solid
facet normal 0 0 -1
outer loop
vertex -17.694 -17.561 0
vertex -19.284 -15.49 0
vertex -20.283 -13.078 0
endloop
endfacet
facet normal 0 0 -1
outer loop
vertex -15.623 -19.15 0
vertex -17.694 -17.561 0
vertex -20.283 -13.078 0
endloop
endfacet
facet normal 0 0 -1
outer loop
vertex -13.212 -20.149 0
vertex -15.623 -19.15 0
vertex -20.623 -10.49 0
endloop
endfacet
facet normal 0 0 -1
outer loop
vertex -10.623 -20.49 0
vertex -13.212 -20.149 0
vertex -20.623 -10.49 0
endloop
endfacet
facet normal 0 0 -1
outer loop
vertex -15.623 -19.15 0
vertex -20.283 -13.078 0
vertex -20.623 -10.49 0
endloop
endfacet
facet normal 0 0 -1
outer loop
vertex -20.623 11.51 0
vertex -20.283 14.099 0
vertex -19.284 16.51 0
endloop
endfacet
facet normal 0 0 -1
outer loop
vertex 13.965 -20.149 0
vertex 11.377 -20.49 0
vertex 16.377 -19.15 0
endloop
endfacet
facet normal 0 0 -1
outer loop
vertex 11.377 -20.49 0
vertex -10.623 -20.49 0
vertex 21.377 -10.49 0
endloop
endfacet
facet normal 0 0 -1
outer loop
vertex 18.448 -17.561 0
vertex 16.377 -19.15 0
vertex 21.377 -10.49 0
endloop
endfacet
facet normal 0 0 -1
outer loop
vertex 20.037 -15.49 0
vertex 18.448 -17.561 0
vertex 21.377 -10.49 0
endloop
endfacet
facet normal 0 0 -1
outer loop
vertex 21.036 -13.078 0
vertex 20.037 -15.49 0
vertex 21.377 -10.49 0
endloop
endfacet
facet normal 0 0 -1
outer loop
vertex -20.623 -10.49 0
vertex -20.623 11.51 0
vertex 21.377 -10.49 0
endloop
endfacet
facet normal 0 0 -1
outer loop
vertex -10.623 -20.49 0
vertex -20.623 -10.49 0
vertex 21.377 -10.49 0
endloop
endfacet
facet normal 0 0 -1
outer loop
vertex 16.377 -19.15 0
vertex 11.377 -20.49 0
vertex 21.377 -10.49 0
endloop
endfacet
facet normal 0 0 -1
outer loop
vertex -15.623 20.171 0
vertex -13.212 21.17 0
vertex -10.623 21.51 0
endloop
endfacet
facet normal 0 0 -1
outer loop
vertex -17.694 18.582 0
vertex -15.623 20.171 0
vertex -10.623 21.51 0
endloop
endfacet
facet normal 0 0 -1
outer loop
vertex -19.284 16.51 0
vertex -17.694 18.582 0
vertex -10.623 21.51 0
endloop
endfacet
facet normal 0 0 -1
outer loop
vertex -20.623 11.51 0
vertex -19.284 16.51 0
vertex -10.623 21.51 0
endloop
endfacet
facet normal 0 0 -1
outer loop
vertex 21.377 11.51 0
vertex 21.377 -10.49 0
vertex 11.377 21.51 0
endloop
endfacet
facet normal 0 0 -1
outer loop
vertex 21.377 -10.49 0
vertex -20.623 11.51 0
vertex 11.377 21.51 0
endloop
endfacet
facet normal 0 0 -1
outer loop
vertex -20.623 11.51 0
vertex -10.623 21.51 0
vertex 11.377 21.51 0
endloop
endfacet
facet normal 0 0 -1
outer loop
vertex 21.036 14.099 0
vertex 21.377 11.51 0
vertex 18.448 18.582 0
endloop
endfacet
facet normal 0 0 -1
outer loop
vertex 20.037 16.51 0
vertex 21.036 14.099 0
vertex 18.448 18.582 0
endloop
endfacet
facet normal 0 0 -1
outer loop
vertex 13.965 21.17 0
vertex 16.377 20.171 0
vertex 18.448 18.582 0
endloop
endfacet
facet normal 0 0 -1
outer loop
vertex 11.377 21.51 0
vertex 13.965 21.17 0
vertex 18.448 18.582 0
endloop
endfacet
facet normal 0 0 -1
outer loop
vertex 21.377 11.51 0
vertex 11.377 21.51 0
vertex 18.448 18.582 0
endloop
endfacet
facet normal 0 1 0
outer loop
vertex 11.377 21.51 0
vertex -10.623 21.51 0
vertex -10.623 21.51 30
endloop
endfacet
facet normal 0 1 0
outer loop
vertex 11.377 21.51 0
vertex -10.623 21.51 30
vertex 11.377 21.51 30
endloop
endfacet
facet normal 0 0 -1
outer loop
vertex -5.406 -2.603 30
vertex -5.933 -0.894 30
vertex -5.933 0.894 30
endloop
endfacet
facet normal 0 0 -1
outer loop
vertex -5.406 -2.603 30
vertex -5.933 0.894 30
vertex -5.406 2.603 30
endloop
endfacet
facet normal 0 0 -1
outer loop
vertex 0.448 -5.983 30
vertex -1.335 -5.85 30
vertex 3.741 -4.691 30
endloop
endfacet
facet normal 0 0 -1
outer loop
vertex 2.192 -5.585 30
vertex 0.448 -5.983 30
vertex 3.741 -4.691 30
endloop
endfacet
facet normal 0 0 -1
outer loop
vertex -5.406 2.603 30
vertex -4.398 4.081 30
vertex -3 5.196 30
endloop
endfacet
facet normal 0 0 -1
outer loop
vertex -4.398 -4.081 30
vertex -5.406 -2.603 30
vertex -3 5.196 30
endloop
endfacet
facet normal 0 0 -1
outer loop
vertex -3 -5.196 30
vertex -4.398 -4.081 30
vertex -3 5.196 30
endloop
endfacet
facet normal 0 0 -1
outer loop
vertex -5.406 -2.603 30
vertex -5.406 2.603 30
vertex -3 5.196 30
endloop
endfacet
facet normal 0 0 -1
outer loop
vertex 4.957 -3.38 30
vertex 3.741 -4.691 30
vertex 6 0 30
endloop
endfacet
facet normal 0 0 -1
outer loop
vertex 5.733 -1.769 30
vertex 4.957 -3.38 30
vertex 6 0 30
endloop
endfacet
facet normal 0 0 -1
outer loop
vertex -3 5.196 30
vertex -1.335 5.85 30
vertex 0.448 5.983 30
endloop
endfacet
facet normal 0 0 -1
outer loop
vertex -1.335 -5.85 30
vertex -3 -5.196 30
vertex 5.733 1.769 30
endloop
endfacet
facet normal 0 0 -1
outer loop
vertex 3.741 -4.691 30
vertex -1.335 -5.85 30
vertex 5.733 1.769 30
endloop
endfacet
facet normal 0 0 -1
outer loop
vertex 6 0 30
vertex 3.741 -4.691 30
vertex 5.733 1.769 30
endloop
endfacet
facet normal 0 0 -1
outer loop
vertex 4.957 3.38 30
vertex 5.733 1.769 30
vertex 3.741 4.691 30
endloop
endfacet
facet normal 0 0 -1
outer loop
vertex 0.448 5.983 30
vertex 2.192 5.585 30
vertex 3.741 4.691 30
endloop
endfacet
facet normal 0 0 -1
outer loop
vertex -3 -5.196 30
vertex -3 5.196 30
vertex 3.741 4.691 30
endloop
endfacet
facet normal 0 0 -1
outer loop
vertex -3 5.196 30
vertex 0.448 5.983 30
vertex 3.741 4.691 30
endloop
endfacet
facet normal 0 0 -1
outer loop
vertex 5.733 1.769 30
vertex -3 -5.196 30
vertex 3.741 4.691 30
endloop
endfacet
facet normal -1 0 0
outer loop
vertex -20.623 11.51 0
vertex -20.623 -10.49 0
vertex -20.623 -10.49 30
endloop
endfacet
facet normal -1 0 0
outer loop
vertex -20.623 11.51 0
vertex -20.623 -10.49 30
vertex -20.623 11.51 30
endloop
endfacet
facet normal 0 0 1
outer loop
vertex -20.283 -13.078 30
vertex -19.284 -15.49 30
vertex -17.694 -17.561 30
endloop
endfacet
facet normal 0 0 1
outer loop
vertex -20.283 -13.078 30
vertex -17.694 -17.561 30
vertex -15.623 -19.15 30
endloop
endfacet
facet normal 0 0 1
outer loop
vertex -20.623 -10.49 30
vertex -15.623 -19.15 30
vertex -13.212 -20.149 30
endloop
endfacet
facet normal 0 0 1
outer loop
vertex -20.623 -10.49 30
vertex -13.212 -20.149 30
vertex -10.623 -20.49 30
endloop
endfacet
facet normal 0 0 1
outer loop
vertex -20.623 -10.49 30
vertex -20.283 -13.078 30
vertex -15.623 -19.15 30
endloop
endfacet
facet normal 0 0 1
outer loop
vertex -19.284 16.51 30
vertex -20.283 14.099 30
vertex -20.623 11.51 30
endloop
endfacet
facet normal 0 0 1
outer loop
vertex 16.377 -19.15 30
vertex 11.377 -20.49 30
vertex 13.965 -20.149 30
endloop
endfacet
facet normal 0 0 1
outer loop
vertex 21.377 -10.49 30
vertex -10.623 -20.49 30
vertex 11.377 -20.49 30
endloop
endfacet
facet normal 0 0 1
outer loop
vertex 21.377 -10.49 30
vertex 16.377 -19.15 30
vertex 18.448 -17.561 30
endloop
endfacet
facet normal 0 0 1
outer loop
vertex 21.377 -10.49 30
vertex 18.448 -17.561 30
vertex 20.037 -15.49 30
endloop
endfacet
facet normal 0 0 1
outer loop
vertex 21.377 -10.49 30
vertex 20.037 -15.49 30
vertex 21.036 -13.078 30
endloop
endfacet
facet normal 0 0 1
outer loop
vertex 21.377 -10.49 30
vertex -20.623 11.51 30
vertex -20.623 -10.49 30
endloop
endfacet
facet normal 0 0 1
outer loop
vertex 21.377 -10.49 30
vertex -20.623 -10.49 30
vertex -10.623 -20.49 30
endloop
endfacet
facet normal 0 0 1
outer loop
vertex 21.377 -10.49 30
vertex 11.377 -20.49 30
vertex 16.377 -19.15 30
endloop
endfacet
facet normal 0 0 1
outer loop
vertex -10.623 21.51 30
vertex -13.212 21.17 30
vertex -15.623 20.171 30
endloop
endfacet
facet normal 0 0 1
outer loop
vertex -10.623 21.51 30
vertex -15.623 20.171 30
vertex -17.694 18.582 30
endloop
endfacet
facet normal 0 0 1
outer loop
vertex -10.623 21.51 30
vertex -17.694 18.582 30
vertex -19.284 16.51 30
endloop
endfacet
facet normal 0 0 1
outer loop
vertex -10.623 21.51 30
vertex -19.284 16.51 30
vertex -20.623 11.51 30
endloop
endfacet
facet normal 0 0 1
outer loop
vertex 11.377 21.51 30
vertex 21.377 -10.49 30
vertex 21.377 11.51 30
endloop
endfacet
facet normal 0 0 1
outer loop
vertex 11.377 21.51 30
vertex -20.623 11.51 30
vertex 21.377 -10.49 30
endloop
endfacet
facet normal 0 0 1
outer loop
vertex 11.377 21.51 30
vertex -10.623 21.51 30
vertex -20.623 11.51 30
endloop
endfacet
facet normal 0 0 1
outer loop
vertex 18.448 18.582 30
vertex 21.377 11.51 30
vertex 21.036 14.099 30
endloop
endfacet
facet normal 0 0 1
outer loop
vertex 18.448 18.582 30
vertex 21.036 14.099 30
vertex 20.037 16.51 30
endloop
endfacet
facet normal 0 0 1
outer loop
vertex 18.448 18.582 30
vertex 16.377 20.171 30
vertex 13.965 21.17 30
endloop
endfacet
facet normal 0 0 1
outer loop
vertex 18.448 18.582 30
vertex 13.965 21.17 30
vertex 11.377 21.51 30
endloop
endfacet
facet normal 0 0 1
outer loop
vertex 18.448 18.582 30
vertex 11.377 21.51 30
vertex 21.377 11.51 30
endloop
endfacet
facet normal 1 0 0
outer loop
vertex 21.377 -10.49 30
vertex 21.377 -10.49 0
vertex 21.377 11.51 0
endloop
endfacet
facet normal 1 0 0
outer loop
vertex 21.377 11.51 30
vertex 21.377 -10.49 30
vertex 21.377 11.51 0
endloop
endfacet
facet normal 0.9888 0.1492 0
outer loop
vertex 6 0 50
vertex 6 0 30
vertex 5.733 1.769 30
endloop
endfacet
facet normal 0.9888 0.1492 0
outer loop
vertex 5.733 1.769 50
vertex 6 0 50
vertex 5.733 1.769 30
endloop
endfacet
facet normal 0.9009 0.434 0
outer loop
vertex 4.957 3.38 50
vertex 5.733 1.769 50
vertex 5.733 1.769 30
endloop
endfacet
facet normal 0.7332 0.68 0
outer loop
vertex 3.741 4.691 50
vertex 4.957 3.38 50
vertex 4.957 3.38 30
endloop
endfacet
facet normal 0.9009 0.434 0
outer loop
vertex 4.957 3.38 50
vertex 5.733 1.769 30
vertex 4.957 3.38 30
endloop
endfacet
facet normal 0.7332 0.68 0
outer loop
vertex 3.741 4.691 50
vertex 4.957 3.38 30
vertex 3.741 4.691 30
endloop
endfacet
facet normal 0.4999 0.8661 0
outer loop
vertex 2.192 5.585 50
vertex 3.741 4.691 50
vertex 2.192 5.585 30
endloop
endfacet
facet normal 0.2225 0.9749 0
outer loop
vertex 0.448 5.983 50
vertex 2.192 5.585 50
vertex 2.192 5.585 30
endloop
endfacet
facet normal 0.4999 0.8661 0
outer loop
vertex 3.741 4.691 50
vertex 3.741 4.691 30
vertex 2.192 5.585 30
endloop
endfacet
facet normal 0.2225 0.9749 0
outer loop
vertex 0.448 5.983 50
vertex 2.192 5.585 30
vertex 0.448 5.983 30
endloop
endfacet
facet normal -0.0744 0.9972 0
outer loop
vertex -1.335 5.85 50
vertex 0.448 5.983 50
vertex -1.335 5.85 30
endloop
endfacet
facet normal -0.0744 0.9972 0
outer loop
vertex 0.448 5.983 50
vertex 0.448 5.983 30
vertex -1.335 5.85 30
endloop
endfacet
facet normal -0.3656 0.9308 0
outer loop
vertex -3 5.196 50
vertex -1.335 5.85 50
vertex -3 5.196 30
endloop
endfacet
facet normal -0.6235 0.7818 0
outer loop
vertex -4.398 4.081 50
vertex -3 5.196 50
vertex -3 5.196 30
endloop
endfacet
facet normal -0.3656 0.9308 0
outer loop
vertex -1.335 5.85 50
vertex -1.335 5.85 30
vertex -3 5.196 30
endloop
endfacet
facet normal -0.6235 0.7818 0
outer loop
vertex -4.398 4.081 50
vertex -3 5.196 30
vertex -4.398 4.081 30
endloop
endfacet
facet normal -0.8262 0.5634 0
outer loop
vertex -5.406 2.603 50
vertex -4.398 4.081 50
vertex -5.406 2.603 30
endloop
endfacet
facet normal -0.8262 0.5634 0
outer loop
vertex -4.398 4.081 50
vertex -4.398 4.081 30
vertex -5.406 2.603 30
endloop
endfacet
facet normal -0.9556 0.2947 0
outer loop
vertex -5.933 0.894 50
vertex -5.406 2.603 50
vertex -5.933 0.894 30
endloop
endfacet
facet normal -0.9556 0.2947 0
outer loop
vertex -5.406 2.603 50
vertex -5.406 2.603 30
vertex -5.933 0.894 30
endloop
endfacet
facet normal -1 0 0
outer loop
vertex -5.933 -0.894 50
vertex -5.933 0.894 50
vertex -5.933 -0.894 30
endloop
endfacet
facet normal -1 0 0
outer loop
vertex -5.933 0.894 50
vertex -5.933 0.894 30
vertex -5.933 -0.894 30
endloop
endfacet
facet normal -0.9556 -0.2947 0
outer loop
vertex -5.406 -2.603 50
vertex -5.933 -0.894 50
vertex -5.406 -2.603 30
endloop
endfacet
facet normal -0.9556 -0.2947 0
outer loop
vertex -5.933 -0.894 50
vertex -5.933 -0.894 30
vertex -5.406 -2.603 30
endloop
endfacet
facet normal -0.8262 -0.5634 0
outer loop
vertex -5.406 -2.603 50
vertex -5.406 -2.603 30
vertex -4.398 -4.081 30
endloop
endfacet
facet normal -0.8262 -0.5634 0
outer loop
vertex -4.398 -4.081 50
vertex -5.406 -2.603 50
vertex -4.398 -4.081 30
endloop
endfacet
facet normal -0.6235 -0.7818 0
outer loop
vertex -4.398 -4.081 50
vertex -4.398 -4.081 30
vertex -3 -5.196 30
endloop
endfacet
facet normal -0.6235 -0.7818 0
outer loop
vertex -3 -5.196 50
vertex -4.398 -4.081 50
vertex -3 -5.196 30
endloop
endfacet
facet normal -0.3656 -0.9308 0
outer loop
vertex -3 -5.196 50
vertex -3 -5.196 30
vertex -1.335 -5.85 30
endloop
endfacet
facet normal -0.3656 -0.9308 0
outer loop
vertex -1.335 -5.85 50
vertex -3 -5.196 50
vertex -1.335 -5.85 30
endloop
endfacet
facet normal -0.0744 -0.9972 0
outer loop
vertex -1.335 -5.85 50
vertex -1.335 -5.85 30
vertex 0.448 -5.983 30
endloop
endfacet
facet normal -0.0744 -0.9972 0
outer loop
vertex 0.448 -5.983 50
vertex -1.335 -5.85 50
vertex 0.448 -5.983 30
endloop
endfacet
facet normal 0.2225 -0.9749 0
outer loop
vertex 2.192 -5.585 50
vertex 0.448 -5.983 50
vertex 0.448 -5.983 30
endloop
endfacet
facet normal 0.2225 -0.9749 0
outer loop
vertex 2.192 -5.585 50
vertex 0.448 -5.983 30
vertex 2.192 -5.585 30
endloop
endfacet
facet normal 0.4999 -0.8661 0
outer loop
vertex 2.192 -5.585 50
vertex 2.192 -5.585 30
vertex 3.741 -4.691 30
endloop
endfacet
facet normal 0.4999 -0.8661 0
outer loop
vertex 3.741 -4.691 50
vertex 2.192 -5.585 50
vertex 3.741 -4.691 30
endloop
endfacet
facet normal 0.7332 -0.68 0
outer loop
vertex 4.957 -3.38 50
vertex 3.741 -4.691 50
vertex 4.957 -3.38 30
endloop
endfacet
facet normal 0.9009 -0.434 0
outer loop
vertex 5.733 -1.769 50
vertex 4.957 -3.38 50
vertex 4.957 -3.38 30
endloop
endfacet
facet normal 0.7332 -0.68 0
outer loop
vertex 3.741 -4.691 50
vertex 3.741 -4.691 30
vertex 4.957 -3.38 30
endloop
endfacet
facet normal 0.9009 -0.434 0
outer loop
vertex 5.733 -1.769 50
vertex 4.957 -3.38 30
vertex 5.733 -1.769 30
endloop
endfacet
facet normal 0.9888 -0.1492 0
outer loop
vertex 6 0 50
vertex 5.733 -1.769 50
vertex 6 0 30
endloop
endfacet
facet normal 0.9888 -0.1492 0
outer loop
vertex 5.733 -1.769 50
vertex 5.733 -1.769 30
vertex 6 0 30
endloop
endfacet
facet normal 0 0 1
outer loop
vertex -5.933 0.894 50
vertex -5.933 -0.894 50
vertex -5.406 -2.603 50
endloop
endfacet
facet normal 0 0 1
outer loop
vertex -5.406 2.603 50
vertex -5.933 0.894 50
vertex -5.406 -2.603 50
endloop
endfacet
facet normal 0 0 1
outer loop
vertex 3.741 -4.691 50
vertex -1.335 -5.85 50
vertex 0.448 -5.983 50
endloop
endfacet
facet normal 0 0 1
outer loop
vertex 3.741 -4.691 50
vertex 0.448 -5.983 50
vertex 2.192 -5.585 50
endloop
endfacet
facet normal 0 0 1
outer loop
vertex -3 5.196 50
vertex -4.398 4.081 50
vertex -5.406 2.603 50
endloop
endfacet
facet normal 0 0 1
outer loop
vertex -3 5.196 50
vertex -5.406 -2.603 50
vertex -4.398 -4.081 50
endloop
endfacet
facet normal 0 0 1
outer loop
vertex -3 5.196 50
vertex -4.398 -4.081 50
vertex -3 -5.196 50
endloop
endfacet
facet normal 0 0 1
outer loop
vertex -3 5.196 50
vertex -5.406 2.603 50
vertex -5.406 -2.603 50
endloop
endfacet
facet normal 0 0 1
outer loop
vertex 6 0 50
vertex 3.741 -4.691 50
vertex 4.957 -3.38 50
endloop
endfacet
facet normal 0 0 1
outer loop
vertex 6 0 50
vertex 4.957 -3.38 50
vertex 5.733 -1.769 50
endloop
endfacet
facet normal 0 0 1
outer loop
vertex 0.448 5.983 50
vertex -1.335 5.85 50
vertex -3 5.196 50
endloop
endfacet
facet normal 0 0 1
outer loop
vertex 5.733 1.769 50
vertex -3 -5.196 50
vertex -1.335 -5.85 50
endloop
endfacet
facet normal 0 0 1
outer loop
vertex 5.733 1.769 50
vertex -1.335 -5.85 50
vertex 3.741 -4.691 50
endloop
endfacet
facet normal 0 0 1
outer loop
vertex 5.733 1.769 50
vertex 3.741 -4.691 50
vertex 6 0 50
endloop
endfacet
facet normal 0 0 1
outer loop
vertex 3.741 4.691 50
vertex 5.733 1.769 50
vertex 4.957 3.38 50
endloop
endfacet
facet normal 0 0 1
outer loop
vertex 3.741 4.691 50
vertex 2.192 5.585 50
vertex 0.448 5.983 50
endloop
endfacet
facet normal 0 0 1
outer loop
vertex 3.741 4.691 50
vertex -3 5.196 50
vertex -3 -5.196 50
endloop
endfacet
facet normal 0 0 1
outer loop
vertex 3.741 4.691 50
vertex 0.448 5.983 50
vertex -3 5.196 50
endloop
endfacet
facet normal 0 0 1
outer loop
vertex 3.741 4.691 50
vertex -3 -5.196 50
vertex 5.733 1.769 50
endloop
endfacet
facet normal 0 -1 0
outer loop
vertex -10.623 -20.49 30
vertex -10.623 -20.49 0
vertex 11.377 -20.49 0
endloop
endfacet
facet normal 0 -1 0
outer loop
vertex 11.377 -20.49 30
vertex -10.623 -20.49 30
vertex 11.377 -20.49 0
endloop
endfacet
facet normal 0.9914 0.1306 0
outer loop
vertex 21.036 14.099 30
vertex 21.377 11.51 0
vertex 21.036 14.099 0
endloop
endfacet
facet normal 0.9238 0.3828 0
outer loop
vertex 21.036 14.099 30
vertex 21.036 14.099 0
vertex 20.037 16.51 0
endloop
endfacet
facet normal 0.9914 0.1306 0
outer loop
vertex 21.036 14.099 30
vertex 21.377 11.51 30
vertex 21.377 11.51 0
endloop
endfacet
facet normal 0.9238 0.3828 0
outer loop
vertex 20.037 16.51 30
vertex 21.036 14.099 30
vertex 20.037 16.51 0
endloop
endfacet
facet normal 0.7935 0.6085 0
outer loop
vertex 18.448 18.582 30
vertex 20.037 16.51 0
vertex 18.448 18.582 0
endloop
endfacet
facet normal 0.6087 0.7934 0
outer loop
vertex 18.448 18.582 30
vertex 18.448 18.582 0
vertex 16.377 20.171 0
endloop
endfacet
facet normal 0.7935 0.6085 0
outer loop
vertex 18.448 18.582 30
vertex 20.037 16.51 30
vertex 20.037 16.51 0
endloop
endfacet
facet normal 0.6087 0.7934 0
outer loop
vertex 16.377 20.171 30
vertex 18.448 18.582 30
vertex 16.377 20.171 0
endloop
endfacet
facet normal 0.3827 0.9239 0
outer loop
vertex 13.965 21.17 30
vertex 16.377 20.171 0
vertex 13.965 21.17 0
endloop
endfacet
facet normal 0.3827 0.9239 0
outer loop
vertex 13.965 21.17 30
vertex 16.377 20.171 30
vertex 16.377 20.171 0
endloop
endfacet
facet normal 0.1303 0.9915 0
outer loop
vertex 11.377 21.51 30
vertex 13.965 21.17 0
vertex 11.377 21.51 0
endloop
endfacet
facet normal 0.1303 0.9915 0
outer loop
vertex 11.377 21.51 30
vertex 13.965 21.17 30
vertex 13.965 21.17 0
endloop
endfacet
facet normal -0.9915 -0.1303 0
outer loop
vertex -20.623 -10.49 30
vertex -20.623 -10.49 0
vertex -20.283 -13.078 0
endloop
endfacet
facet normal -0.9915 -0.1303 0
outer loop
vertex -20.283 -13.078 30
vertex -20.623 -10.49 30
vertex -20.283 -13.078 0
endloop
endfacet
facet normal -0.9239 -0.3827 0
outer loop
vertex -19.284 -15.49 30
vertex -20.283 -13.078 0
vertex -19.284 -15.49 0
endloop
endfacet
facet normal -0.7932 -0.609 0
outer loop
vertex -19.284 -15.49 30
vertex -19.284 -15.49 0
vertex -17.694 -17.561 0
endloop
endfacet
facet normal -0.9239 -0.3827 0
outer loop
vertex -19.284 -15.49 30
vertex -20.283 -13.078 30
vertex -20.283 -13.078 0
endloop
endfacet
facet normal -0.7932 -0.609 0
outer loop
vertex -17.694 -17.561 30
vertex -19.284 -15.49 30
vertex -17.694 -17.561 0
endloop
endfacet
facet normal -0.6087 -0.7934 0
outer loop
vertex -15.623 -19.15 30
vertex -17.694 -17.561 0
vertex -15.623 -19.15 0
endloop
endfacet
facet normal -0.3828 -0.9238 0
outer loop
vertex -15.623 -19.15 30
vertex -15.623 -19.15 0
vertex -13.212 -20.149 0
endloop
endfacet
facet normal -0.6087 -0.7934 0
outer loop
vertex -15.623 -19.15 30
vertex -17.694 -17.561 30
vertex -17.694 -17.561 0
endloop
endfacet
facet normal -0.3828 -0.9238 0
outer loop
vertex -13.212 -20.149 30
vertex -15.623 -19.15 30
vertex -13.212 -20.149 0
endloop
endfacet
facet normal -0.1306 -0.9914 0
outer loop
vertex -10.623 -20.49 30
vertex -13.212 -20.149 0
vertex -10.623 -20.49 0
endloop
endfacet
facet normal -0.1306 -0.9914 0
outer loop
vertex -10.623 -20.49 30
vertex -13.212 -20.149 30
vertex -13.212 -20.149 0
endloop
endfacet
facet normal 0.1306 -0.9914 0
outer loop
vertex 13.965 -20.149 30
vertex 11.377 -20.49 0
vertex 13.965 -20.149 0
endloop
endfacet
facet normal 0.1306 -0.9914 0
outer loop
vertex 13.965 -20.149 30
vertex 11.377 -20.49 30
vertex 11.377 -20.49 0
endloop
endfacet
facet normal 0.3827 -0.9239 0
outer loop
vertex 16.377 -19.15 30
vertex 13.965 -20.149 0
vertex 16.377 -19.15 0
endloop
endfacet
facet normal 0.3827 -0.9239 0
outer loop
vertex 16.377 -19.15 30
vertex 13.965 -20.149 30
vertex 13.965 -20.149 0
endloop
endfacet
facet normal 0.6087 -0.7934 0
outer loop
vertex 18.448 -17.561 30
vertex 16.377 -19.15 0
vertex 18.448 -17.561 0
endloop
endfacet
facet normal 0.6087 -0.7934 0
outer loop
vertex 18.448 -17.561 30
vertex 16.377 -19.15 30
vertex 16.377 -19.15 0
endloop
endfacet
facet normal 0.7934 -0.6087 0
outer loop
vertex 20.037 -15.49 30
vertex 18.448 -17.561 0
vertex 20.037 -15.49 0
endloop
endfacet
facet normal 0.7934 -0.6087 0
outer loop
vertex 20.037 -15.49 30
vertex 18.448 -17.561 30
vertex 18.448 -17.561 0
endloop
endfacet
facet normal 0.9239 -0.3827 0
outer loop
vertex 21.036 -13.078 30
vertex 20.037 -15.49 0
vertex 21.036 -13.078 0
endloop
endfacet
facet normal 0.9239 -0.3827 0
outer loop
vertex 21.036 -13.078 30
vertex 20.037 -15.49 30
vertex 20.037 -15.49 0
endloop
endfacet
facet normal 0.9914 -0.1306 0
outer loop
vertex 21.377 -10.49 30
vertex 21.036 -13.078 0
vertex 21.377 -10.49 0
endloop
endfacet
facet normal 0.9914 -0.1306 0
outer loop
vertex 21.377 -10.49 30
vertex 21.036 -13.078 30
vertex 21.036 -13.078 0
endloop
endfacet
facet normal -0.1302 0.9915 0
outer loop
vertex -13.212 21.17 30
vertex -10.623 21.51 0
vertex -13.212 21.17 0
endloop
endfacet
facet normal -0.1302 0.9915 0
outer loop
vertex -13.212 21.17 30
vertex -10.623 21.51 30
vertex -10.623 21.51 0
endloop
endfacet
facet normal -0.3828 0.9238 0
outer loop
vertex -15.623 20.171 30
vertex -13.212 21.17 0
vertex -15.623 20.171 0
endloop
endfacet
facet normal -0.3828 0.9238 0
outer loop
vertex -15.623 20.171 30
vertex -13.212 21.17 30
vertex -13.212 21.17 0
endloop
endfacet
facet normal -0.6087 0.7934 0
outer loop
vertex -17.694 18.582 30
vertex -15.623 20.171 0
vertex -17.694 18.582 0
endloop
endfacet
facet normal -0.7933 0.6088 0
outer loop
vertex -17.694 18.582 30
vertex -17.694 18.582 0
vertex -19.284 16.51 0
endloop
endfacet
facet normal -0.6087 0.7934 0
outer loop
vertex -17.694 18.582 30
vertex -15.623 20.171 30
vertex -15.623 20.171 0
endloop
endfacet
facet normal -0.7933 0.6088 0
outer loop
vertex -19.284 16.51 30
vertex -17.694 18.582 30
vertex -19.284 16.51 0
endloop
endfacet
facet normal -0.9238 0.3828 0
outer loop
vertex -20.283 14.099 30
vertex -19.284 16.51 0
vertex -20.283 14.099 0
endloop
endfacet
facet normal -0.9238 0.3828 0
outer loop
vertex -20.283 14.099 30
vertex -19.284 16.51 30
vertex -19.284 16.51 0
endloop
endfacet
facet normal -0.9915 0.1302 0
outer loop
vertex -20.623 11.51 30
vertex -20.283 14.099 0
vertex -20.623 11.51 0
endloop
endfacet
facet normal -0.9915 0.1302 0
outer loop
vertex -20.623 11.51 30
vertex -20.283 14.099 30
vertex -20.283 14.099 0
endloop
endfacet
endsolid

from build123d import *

# Parameters (mm, degrees)
SKETCH_1_W      = 42
SKETCH_1_H      = 42
EXTRUDE_1_DEPTH = 30
SKETCH_2_R      = 6
EXTRUDE_2_DEPTH = 20
FILLET_2_R      = 10
FILLET_3_R      = 10
FILLET_4_R      = 10
FILLET_5_R      = 10


with BuildPart() as part:
    # 草图1 → 凸台-拉伸1 (new body)
    with BuildSketch(Plane.XY):
        with Locations((0.376569841, 0.510488218)):
            Rectangle(SKETCH_1_W, SKETCH_1_H)
    extrude(amount=EXTRUDE_1_DEPTH)

    # 圆角2
    fillet_2_edges = [part.edges().sort_by_distance(p)[0] for p in [
        (21.376569841, 21.510488218, 15),
    ]]
    fillet(fillet_2_edges, radius=FILLET_2_R)

    # 圆角3
    fillet_3_edges = [part.edges().sort_by_distance(p)[0] for p in [
        (-20.623430159, 21.510488218, 15),
    ]]
    fillet(fillet_3_edges, radius=FILLET_3_R)

    # 圆角4
    fillet_4_edges = [part.edges().sort_by_distance(p)[0] for p in [
        (-20.623430159, -20.489511782, 15),
    ]]
    fillet(fillet_4_edges, radius=FILLET_4_R)

    # 圆角5
    fillet_5_edges = [part.edges().sort_by_distance(p)[0] for p in [
        (21.376569841, -20.489511782, 15),
    ]]
    fillet(fillet_5_edges, radius=FILLET_5_R)


with BuildPart() as body_2:
    # 草图2 → 凸台-拉伸2 (new body)
    with BuildSketch(Plane.XY.offset(30)):
        Circle(SKETCH_2_R)
    extrude(amount=EXTRUDE_2_DEPTH)


solid = Compound([part.part, body_2.part])
